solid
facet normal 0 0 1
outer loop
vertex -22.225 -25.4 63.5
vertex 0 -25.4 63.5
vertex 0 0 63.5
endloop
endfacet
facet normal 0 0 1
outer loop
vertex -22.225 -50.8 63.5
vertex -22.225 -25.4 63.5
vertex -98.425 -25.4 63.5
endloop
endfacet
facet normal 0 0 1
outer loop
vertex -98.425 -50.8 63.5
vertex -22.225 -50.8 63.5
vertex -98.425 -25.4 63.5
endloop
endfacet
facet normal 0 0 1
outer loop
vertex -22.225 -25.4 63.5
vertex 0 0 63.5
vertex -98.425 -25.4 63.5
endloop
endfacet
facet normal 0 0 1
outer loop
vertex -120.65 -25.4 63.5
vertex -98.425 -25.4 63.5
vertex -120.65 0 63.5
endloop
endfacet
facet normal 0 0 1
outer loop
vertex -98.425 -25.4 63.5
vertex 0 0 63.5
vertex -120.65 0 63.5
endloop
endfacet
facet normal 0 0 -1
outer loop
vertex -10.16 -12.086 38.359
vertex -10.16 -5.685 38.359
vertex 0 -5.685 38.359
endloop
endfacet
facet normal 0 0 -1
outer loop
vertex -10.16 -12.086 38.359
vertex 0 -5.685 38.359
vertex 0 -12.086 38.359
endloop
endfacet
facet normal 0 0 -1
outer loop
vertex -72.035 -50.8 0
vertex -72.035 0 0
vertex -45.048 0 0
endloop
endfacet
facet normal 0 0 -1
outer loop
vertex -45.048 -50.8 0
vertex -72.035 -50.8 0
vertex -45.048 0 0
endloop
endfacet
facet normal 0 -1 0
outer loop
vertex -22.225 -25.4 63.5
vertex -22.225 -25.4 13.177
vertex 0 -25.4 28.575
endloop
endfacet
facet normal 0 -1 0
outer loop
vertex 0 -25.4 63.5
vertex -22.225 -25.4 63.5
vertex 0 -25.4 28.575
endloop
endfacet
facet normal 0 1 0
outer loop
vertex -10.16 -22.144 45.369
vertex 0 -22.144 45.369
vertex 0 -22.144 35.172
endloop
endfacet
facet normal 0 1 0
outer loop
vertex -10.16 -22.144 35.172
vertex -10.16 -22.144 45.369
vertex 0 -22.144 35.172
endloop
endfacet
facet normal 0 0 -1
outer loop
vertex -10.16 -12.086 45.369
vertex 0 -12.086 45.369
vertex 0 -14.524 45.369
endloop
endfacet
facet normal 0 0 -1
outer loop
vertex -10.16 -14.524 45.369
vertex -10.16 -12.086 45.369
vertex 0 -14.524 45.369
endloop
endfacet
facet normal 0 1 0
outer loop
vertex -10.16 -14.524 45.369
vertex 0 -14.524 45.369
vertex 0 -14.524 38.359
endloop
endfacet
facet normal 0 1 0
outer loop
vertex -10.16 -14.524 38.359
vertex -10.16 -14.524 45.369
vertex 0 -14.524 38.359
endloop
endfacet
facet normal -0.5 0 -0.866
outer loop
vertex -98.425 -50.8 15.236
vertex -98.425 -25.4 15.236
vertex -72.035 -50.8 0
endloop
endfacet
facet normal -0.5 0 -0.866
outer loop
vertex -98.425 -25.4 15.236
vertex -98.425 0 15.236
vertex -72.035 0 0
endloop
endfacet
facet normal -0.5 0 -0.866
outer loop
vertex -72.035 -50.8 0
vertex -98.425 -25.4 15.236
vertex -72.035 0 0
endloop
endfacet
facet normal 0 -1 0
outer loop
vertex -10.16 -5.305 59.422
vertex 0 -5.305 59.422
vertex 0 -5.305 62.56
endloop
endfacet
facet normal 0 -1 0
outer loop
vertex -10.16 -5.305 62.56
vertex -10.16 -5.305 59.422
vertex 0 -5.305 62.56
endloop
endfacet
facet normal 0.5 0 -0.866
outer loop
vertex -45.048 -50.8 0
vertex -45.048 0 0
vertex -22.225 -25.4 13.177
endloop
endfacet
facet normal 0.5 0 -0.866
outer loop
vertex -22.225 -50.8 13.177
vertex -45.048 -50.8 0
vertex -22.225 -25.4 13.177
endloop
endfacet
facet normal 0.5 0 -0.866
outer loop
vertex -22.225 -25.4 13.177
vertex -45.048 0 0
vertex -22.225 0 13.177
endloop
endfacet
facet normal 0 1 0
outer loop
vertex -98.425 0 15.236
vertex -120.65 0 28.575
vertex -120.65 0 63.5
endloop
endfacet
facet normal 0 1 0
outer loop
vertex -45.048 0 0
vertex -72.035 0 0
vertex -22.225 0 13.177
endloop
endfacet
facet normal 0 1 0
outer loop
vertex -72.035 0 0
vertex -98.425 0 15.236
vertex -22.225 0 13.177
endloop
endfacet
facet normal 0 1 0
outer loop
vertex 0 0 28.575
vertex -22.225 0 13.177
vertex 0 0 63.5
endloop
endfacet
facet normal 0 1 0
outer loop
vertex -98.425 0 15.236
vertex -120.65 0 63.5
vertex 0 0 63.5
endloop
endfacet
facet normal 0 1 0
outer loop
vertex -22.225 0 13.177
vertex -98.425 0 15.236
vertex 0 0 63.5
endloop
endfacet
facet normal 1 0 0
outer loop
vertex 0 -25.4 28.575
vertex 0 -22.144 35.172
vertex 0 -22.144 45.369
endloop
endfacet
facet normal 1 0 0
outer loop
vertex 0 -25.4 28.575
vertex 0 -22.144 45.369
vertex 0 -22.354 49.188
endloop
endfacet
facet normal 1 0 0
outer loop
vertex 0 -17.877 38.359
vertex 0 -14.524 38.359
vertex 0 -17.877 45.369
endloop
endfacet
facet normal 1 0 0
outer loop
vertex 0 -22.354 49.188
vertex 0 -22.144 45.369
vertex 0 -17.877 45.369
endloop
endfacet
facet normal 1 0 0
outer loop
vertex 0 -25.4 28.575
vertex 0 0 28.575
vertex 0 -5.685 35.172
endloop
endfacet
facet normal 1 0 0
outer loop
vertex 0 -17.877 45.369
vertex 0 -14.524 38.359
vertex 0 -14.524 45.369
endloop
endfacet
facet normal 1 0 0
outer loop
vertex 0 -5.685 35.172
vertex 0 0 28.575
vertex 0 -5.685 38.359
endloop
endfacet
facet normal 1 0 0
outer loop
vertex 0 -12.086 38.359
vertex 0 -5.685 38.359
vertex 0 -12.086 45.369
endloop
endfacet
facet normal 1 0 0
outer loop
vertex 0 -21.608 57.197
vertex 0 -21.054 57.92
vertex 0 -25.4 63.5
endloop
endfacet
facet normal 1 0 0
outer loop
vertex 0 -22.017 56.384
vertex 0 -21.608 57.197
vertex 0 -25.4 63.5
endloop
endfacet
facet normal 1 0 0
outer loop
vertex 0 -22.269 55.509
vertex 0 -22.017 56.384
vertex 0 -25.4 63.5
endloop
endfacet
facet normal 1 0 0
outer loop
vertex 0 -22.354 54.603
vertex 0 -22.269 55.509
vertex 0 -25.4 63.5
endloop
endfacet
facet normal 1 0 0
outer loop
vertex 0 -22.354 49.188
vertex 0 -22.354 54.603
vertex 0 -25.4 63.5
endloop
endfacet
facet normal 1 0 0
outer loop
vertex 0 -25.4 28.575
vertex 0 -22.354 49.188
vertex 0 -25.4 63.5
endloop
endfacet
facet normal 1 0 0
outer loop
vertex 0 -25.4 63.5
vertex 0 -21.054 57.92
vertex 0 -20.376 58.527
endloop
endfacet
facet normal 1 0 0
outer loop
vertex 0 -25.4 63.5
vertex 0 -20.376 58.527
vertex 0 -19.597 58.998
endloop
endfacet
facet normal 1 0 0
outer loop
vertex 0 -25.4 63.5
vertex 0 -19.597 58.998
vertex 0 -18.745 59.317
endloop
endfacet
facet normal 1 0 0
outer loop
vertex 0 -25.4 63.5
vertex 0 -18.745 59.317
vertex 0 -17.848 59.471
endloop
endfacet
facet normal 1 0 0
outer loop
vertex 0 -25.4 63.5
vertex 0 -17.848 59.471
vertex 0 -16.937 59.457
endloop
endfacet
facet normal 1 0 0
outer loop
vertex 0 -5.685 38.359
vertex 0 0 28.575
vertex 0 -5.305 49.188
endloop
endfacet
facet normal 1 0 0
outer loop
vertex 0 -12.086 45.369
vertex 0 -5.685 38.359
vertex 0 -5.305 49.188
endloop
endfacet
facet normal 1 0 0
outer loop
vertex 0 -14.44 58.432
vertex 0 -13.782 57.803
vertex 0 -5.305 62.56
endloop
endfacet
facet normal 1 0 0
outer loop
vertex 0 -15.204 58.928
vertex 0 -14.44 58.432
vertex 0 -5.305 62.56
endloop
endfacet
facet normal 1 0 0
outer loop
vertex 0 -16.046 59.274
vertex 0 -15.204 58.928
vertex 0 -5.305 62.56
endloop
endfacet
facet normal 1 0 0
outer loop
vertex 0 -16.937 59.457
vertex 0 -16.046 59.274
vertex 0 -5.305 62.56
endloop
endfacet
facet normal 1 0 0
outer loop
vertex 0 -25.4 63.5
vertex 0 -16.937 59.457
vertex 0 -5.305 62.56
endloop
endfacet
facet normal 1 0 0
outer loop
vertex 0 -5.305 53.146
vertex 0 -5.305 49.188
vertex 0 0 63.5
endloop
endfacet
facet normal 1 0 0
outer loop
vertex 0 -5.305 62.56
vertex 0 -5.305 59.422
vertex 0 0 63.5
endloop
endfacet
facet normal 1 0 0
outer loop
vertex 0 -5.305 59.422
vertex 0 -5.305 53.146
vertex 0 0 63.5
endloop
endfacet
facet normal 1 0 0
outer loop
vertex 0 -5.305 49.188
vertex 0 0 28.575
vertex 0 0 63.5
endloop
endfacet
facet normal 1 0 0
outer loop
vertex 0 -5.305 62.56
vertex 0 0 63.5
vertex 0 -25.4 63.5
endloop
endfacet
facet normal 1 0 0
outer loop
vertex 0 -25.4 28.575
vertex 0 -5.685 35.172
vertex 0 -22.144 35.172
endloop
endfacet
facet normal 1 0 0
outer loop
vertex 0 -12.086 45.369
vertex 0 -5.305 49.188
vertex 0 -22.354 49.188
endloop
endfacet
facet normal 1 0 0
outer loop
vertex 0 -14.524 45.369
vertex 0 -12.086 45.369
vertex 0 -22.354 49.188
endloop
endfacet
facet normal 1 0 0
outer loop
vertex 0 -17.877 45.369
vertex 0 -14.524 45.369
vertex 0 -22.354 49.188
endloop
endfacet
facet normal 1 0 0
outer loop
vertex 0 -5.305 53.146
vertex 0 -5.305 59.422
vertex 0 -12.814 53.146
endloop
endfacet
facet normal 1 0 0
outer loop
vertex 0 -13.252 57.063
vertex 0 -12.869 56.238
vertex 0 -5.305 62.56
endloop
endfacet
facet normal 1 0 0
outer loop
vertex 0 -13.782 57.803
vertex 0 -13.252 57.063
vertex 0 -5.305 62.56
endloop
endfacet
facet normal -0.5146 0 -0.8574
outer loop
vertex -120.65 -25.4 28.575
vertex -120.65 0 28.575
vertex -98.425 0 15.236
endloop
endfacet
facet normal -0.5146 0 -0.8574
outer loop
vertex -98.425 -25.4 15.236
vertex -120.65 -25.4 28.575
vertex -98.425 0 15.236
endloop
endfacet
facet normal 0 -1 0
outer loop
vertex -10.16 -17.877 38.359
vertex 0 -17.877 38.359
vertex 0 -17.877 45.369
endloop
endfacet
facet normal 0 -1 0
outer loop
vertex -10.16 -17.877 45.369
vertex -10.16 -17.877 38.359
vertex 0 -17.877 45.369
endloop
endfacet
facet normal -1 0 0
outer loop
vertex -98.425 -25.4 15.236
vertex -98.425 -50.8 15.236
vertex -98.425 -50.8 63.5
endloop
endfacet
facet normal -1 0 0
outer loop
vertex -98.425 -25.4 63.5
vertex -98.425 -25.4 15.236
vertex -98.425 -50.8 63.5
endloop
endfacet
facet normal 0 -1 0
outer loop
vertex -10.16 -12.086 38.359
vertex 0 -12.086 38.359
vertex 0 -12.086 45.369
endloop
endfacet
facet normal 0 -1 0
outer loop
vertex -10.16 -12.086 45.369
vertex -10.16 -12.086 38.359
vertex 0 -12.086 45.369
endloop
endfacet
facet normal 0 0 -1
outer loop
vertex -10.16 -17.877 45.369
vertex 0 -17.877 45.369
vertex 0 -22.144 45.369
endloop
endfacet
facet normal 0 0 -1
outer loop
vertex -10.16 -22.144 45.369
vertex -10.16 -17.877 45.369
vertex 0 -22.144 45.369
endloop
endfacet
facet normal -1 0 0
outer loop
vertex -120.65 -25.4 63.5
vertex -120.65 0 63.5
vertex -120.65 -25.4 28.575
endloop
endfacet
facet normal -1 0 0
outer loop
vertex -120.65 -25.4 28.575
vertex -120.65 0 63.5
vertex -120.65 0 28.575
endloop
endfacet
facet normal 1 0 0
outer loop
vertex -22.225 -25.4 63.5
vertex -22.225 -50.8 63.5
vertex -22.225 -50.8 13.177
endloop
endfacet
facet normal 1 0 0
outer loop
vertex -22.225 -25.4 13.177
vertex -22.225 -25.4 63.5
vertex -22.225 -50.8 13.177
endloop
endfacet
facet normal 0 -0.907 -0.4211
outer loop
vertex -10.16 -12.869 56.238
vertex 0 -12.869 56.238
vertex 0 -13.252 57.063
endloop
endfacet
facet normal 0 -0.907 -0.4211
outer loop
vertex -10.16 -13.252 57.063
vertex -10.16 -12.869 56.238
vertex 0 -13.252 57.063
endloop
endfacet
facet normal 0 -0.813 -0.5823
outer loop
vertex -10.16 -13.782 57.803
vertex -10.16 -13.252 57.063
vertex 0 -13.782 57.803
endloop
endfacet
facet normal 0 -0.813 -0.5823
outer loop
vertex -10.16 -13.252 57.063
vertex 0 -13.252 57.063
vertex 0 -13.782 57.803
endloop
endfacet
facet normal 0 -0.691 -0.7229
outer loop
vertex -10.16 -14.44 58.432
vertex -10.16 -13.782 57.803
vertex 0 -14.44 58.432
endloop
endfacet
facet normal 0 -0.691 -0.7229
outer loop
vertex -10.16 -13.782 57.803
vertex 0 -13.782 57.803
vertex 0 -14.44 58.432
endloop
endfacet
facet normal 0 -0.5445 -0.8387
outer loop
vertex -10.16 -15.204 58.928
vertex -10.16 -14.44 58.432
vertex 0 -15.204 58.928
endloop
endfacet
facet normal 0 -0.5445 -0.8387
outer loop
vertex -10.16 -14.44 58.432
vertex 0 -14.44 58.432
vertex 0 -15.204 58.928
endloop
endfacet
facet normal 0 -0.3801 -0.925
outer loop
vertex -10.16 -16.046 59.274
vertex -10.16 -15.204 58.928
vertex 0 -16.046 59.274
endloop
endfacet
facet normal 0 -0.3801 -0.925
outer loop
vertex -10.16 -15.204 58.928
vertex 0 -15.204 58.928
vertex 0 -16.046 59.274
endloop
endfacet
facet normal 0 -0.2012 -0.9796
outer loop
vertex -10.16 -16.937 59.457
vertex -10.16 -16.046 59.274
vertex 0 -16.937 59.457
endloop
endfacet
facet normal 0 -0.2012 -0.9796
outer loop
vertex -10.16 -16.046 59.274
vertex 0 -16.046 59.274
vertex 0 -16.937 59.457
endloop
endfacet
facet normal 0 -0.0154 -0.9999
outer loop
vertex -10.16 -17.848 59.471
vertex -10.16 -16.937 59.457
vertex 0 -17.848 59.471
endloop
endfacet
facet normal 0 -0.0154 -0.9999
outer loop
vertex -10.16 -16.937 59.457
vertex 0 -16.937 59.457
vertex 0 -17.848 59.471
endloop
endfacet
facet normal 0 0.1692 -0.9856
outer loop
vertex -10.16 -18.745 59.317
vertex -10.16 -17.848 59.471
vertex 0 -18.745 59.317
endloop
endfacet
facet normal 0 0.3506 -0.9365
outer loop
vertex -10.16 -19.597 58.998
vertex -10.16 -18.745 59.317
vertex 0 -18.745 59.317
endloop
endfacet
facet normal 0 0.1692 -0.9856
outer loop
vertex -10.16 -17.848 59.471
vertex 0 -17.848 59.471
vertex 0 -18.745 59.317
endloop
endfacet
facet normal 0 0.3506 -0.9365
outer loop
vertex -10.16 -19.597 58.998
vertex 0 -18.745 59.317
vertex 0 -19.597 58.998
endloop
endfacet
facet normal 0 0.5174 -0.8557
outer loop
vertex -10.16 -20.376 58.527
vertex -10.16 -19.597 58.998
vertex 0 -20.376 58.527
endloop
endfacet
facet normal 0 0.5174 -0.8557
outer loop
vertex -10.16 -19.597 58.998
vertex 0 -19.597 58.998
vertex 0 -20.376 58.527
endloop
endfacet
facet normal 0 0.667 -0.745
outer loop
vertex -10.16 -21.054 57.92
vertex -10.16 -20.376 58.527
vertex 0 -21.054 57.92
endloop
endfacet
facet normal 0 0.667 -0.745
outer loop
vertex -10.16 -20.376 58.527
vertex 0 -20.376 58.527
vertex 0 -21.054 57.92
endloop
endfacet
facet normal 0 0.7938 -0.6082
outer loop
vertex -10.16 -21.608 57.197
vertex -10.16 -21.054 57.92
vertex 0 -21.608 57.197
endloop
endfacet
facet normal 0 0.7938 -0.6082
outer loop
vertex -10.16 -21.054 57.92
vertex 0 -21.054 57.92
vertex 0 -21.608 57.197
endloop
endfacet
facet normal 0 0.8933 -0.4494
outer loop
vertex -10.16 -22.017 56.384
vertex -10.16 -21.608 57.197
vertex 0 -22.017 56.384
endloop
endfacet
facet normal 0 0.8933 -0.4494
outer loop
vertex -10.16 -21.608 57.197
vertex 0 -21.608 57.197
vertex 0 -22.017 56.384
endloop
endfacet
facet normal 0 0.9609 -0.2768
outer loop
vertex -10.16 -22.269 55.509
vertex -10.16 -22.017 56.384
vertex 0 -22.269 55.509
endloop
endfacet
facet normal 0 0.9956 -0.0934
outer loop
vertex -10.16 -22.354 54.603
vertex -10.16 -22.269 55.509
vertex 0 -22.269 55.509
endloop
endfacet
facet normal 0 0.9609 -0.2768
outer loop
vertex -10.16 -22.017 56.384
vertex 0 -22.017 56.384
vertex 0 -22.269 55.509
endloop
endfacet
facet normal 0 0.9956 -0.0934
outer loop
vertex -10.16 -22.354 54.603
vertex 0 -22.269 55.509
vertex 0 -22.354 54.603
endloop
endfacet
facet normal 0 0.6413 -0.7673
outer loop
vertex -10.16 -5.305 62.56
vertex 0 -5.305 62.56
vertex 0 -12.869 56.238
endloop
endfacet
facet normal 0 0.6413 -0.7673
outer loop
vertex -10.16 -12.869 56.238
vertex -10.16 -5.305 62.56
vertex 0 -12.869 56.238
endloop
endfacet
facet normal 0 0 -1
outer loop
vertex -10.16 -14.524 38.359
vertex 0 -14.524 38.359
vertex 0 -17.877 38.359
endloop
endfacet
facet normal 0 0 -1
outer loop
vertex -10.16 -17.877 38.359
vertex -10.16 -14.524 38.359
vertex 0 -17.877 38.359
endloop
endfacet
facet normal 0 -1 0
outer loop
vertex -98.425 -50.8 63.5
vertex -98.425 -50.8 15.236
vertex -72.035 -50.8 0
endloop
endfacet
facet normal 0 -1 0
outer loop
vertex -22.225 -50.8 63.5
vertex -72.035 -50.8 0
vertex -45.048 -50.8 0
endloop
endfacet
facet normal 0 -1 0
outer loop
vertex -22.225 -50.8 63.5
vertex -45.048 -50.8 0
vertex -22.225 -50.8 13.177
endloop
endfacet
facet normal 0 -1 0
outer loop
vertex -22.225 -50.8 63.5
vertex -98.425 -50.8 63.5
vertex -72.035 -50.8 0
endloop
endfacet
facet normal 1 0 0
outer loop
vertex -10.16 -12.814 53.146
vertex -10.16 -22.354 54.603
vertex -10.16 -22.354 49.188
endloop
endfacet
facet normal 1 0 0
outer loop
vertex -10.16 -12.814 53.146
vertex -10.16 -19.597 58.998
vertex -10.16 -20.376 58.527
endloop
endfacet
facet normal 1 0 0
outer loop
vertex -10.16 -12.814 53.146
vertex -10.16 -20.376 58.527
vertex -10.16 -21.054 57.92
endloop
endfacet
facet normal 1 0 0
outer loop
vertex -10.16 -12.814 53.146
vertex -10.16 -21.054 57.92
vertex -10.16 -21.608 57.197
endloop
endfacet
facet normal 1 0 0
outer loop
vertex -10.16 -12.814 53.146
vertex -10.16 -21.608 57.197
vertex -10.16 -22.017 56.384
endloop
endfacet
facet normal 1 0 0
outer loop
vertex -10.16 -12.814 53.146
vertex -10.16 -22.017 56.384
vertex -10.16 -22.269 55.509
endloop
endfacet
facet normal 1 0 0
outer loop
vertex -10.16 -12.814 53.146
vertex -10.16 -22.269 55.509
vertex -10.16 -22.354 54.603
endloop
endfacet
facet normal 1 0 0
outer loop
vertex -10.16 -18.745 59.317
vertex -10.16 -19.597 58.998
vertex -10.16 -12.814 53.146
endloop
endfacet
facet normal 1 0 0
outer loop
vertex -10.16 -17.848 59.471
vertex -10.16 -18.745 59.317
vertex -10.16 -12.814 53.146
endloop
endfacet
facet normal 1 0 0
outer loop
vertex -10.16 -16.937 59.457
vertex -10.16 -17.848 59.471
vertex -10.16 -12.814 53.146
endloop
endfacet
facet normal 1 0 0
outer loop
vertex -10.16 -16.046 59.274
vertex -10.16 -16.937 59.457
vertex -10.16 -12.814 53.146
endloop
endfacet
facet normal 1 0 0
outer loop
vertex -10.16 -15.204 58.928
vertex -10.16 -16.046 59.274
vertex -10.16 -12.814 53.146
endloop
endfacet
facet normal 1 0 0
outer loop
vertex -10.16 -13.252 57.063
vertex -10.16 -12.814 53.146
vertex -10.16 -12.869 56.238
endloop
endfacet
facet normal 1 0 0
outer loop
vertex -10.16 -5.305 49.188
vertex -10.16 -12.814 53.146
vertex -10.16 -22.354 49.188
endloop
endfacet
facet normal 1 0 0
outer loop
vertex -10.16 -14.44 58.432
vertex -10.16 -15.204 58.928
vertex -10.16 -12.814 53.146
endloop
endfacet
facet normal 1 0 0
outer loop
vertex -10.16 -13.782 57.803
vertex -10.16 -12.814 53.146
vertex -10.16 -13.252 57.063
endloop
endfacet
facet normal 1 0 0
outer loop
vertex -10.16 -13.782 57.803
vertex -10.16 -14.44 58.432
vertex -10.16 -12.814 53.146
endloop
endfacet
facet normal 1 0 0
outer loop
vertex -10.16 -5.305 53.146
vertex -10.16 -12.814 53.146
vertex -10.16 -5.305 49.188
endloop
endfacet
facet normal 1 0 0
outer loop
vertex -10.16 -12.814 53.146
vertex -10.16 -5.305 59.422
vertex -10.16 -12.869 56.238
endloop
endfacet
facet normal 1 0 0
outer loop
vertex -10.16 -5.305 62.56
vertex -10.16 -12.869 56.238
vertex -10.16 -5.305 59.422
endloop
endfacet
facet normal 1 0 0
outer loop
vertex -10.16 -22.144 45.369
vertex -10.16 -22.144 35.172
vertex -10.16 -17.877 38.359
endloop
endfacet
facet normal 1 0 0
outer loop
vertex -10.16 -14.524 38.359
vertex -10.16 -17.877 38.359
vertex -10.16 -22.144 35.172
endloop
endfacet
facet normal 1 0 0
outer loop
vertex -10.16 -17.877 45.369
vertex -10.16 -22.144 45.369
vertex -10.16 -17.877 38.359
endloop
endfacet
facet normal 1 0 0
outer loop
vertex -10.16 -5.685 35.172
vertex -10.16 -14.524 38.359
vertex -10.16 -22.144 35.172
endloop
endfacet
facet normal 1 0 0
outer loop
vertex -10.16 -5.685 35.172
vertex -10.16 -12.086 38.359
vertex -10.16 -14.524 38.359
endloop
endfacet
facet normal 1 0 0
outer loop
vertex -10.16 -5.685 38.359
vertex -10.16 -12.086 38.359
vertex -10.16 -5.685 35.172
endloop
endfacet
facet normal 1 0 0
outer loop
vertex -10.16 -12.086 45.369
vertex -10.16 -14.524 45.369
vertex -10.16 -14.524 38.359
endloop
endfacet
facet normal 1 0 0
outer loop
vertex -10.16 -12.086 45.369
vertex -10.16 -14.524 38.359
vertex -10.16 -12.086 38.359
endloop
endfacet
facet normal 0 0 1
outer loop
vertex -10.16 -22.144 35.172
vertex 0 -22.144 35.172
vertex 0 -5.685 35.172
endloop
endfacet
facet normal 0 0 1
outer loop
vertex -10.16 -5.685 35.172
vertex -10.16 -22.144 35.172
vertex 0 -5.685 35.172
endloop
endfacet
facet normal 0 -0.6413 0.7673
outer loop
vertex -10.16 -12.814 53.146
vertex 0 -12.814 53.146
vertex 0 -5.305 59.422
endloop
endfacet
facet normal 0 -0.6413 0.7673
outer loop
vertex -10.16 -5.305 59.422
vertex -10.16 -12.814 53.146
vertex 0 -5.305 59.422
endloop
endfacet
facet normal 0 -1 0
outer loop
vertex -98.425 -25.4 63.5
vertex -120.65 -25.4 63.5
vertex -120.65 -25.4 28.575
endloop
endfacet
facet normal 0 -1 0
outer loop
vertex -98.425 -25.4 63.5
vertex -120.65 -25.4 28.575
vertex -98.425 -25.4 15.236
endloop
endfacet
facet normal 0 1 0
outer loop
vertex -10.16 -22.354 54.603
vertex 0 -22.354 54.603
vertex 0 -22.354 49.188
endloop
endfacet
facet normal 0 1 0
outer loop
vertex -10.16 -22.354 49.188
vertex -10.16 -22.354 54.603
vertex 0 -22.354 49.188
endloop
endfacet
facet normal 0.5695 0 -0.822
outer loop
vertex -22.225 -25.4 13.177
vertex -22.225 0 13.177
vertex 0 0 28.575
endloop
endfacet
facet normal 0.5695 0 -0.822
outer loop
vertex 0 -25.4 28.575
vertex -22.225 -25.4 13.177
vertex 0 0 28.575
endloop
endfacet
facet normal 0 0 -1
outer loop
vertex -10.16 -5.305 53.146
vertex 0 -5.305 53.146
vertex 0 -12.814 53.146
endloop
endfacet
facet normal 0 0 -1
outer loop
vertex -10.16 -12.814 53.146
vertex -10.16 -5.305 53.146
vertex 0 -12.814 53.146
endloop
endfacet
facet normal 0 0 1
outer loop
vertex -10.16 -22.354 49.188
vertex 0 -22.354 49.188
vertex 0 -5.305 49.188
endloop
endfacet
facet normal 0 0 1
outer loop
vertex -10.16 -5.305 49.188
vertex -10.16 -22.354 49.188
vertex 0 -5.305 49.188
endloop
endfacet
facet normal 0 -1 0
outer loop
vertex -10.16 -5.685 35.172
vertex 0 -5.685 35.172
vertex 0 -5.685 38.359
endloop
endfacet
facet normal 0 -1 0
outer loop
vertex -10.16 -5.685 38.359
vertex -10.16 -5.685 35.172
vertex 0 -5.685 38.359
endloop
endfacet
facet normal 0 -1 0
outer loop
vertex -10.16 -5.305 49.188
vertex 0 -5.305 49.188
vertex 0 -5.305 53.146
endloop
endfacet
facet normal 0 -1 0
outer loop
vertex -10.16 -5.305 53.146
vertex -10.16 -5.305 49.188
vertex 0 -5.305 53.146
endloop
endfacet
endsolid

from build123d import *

# Parameters (mm, degrees)
F1_DEPTH = 50.8
F3_DEPTH = 25.4
F5_DEPTH = 10.16


with BuildPart() as f1:
    # F0 (on Front) → F1 (new body)
    with BuildSketch(Plane.XZ):
        Polygon((-72.035342, 0), (-45.047842, 0), (-22.225, 13.176774), (0, 28.575), (0, 63.5), (-120.65, 63.5), (-120.65, 28.575), (-98.425, 15.236076), align=None)
    extrude(amount=F1_DEPTH)

    # F2 (on face) → F3 (cut)
    with BuildSketch(Plane.XZ.offset(50.8)):
        Polygon((-22.225, 63.5), (-22.225, 13.176774), (0, 28.575), (0, 63.5), align=None)
        Polygon((-98.425, 15.236076), (-98.425, 63.5), (-120.65, 63.5), (-120.65, 28.575), align=None)
    extrude(amount=-F3_DEPTH, mode=Mode.SUBTRACT)

    # F4 (on face) → F5 (cut)
    with BuildSketch(Plane.YZ):
        Polygon((-22.143953, 35.172231), (-5.684754, 35.172231), (-5.684754, 38.358856), (-12.085554, 38.358856), (-12.085554, 45.369253), (-14.523953, 45.369253), (-14.523953, 38.358856), (-17.876754, 38.358856), (-17.876754, 45.369253), (-22.143953, 45.369253), align=None)
        with BuildLine():
            Line((-22.353571, 54.602597), (-22.353571, 49.187634))
            Line((-22.353571, 49.187634), (-5.304984, 49.187634))
            Line((-5.304984, 49.187634), (-5.304984, 53.145573))
            Line((-5.304984, 53.145573), (-12.81351, 53.145573))
            Line((-12.81351, 53.145573), (-5.304984, 59.421983))
            Line((-5.304984, 59.421983), (-5.304984, 62.560186))
            Line((-5.304984, 62.560186), (-12.86866, 56.237676))
            ThreePointArc((-12.86866, 56.237676), (-18.29978, 59.415003), (-22.353571, 54.602597))
        make_face()
    extrude(amount=-F5_DEPTH, mode=Mode.SUBTRACT)


solid = f1.part
